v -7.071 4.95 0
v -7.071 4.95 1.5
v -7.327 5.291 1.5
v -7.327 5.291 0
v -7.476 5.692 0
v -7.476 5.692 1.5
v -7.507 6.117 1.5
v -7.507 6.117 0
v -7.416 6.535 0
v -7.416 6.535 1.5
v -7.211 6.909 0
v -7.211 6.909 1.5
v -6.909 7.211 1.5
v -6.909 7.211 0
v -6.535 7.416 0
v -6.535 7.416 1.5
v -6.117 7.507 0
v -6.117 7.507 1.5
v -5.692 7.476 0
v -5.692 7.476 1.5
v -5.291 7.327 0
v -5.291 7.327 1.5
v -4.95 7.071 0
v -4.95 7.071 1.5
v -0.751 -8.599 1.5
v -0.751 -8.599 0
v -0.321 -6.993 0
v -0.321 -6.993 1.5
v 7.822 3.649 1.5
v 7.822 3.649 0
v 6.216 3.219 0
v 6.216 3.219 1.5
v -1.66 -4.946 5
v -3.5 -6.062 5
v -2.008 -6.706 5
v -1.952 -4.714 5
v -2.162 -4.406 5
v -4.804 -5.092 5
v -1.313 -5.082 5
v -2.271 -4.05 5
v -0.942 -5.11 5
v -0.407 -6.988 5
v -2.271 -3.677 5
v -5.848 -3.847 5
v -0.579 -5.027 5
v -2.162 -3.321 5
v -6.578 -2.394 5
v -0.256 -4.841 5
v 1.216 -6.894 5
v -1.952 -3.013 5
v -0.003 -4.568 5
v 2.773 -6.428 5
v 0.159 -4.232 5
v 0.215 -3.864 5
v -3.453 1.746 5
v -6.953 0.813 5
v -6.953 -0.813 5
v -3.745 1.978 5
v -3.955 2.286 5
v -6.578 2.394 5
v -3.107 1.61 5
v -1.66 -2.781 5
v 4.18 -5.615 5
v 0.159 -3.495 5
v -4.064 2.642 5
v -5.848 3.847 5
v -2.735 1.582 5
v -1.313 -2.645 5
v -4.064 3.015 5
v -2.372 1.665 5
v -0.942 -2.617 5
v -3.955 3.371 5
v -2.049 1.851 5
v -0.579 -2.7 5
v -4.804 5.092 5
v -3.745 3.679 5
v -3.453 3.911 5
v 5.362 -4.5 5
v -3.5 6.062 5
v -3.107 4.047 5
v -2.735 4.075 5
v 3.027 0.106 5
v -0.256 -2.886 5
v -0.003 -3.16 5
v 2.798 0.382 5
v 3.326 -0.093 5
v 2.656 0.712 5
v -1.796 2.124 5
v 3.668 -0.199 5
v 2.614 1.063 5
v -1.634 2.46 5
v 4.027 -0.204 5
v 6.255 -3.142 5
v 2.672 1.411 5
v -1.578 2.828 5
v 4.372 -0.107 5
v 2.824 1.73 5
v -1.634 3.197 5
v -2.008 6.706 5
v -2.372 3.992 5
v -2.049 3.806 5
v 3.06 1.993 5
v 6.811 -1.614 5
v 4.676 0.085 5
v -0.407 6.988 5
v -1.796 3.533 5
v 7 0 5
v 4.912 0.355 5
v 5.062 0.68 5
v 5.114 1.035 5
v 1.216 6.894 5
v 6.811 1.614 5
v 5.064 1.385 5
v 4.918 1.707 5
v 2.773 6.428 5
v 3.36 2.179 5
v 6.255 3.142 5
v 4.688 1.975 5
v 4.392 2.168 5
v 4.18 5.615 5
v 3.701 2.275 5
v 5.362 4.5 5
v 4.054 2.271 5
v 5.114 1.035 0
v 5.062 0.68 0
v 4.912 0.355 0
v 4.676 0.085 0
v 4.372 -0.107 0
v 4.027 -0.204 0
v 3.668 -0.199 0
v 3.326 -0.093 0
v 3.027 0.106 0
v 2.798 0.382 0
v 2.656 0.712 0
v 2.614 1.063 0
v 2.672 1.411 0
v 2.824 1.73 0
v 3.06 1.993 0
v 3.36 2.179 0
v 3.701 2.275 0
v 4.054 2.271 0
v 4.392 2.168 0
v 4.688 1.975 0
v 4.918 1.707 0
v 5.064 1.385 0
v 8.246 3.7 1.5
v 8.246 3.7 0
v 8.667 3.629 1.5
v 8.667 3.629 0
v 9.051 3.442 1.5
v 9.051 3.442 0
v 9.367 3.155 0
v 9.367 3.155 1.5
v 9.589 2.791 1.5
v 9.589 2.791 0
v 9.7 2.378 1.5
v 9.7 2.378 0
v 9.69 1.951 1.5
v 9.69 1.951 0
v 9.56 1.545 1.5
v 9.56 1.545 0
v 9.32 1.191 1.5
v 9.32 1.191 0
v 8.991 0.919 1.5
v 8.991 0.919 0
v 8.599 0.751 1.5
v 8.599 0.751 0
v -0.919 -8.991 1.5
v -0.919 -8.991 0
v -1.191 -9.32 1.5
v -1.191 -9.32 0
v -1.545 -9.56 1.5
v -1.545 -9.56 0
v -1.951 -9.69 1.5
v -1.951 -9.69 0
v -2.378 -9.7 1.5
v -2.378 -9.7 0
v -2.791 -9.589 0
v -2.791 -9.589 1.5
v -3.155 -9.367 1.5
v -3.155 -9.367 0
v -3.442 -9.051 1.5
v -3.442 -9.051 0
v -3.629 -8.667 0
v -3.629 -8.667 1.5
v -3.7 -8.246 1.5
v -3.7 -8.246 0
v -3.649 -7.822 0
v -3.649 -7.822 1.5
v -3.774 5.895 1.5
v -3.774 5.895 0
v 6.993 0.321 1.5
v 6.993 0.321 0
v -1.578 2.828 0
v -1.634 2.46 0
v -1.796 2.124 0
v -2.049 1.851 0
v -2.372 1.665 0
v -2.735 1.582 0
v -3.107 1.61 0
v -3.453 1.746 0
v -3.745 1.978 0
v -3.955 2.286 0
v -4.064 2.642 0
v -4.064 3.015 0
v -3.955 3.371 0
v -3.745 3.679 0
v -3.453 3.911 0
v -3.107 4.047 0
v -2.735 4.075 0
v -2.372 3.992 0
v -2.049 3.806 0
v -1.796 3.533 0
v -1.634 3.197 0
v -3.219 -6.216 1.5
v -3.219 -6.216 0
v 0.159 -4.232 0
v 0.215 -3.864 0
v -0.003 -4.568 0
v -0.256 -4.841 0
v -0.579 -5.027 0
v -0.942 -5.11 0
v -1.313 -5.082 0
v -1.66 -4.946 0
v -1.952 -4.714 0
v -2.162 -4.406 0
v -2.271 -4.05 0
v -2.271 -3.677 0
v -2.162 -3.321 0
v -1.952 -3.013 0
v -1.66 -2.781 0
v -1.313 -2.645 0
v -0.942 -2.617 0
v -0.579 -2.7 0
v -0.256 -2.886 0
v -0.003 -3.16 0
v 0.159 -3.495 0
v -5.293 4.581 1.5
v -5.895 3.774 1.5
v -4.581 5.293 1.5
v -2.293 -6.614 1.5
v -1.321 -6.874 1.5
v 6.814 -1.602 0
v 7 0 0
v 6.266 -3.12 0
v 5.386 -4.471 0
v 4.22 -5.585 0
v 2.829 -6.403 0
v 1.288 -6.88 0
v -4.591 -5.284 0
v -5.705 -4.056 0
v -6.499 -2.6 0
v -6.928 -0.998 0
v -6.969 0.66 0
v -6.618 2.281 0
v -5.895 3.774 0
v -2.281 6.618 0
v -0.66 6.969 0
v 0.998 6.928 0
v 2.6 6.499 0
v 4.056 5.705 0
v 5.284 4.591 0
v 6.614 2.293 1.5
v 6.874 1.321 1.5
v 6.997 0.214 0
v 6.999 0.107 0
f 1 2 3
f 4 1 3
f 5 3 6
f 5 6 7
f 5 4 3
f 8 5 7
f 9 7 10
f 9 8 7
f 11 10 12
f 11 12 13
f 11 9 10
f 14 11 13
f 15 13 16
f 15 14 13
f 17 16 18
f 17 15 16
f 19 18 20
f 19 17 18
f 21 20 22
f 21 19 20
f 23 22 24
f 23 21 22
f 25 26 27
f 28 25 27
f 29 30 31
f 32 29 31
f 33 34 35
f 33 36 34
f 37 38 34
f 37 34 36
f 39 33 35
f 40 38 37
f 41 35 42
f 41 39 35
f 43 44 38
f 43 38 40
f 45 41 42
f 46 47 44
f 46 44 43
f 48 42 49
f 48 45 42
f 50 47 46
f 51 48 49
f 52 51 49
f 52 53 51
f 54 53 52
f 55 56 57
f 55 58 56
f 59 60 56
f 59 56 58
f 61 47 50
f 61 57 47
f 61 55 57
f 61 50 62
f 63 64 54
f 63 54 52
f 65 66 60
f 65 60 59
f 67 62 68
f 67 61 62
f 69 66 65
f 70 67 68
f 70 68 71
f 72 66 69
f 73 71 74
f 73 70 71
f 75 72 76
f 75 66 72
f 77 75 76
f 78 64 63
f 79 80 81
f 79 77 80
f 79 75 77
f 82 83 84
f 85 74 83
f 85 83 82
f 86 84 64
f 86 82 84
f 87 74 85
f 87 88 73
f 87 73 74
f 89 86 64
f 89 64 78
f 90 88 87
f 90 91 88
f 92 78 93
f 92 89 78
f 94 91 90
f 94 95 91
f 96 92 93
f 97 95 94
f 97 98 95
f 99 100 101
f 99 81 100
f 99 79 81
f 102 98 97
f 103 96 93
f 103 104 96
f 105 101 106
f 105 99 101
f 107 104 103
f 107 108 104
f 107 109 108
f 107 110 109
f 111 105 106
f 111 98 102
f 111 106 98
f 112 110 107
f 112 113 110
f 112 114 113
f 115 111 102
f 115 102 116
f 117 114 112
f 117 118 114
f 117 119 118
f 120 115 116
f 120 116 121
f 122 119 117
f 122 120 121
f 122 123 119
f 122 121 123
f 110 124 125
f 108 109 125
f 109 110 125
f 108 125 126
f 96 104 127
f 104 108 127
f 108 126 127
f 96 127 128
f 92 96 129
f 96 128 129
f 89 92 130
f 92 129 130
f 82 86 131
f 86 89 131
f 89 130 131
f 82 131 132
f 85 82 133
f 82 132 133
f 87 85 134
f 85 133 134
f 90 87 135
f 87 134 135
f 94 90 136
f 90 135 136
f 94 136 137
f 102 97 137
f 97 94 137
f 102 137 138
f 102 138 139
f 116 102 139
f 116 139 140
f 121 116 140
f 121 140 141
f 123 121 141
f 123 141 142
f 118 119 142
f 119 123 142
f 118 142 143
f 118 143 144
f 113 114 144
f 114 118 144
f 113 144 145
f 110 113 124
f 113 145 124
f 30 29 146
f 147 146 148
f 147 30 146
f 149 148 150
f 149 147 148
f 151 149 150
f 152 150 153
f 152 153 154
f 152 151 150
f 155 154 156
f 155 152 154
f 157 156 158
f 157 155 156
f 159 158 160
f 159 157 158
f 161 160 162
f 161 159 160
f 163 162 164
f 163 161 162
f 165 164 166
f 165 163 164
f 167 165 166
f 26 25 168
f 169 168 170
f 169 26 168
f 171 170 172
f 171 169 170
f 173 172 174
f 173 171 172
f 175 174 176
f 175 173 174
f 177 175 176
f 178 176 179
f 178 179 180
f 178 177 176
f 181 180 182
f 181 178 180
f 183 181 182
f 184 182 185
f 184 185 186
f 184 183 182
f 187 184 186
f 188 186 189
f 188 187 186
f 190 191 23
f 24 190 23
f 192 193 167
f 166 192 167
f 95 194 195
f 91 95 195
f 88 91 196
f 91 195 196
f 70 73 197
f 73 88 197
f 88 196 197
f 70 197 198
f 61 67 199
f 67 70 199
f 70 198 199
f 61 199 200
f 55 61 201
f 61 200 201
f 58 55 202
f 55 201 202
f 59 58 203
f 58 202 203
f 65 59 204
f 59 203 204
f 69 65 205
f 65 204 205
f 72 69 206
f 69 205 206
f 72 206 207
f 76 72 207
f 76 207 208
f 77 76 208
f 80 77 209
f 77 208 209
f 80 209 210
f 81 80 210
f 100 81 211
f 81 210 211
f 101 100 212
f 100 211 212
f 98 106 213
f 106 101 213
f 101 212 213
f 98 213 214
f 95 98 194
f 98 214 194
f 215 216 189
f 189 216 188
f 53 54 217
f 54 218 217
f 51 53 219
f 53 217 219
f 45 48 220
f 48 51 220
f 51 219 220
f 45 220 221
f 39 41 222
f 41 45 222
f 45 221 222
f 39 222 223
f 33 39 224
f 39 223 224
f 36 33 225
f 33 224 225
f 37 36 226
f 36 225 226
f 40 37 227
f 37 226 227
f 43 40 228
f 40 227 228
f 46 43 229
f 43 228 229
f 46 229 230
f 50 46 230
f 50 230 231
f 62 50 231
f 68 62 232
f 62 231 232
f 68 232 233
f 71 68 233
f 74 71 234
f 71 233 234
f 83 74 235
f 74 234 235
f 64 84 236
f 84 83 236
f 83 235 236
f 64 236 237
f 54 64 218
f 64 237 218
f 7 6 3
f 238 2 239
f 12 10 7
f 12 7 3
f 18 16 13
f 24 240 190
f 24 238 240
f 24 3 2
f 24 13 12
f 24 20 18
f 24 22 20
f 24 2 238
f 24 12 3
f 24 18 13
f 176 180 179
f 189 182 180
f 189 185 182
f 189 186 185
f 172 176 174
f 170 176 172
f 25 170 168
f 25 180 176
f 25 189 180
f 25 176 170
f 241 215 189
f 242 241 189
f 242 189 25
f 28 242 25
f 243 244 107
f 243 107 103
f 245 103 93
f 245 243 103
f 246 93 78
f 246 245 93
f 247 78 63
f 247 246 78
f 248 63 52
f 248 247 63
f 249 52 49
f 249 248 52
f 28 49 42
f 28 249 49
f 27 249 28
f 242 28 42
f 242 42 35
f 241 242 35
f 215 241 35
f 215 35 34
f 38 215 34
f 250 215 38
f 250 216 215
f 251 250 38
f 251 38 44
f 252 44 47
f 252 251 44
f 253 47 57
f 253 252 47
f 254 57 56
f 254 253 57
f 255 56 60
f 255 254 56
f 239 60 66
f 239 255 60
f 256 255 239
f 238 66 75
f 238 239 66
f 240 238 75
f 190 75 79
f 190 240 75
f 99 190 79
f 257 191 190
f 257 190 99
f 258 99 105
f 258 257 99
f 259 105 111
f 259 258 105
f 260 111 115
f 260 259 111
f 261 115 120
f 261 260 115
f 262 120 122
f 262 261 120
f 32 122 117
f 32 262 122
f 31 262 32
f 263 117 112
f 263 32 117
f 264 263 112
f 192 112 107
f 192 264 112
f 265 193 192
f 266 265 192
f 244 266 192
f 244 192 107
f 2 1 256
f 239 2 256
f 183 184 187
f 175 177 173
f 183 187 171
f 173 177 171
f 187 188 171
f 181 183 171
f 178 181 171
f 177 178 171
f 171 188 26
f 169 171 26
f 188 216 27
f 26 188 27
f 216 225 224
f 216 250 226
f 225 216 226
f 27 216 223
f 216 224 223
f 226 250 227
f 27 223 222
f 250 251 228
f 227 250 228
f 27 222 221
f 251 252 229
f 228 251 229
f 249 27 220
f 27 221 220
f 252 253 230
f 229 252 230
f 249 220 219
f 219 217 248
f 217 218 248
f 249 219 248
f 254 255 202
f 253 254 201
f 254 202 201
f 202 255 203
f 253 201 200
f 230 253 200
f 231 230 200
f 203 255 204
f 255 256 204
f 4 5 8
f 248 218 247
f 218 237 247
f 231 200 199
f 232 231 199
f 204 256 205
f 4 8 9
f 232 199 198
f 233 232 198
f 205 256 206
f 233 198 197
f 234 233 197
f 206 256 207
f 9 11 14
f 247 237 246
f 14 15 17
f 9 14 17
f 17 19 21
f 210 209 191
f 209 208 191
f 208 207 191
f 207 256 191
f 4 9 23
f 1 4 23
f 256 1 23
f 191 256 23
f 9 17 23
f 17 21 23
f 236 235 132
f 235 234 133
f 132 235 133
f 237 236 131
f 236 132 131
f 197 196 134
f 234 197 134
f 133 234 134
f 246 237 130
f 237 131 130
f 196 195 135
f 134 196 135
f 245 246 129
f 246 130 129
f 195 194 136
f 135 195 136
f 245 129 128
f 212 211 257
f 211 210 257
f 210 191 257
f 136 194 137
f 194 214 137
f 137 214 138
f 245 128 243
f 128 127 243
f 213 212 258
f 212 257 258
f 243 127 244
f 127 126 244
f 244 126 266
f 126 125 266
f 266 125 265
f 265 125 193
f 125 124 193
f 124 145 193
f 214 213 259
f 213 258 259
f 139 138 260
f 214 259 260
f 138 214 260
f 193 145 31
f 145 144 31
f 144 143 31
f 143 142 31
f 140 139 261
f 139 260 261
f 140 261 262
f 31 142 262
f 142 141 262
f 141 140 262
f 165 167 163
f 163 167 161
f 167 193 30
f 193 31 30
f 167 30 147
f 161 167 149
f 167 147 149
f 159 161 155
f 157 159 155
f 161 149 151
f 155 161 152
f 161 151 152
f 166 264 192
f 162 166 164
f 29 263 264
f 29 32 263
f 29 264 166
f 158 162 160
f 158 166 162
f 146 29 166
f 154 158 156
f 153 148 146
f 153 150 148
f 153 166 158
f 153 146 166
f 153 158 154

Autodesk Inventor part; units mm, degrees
ref_plane "YZ Plane" through (0, 0, 0) normal (1, 0, 0) x (0, 1, 0)
ref_plane "XZ Plane" through (0, 0, 0) normal (0, 1, 0) x (-1, 0, 0)
ref_plane "XY Plane" through (0, 0, 0) normal (0, 0, 1) x (1, 0, 0)
sketch "スケッチ1" plane through (0, 0, 0) normal (0, 0, 1) x (1, 0, 0)
  circle A0 centre (0, 0) radius 7
  circle A1 centre (-2.8284, 2.8284) radius 1.25
  circle A2 centre (-1.0353, -3.8637) radius 1.25
  circle A3 centre (3.8637, 1.0353) radius 1.25
  circle A4 centre (0, 0) radius 10
  line L0 (3.8637, 1.0353) -> (8.2104, 2.2) construction
  line L1 (4.2519, -0.4136) -> (8.5986, 0.7511)
  line L2 (7.8221, 3.6489) -> (3.4755, 2.4842)
  arc A5 (3.4755, 2.4842) -> (4.2519, -0.4136) centre (3.8637, 1.0353) ccw
  arc A6 (8.5986, 0.7511) -> (7.8221, 3.6489) centre (8.2104, 2.2) ccw
  line L3 (3.8637, 1.0353) -> (0, 0)
  line L4 (-7.0711, 4.9497) -> (-3.8891, 1.7678)
  arc A7 (-4.9497, 7.0711) -> (-7.0711, 4.9497) centre (-6.0104, 6.0104) ccw
  line L5 (-1.7678, 3.8891) -> (-4.9497, 7.0711)
  line L6 (-0.7511, -8.5986) -> (0.4136, -4.2519)
  arc A8 (-3.6489, -7.8221) -> (-0.7511, -8.5986) centre (-2.2, -8.2104) ccw
  line L7 (-2.4842, -3.4755) -> (-3.6489, -7.8221)
  point P0 (6.037, 1.6176)
  point P1 (6.2162, 3.2185)
  point P2 (6.9926, 0.3208)
  point P3 (-3.7741, 5.8954)
  point P4 (-5.8954, 3.7741)
  point P5 (-3.2185, -6.2162)
  point P6 (-0.3208, -6.9926)
  dimension "d0" = 14
  dimension "d1" = 2.5
  dimension "d2" = 4
  dimension "d5" = 360
  dimension "d9" = 20
  dimension "d18" = 3
  dimension "d21" = 360
extrude "押し出し1" add sketch "スケッチ1" along normal blind 5 contours A0 L2 A5 L1 | L1 A5 L2 A0
extrude "押し出し2" add sketch "スケッチ1" along normal blind 1.5 contours A0 L2 A6 L1 | L6 A8 L7 A0 | A0 L4 A7 L5
thread "ねじ1" size "M3x0.5" class "6H" standard "ANSI Metric M Profile" full length
thread "ねじ2" size "M3x0.5" class "6H" standard "ANSI Metric M Profile" full length
thread "ねじ3" size "M3x0.5" class "6H" standard "ANSI Metric M Profile" full length
properties part number "アームカムAL" material "アルミニウム 2014-T4"
